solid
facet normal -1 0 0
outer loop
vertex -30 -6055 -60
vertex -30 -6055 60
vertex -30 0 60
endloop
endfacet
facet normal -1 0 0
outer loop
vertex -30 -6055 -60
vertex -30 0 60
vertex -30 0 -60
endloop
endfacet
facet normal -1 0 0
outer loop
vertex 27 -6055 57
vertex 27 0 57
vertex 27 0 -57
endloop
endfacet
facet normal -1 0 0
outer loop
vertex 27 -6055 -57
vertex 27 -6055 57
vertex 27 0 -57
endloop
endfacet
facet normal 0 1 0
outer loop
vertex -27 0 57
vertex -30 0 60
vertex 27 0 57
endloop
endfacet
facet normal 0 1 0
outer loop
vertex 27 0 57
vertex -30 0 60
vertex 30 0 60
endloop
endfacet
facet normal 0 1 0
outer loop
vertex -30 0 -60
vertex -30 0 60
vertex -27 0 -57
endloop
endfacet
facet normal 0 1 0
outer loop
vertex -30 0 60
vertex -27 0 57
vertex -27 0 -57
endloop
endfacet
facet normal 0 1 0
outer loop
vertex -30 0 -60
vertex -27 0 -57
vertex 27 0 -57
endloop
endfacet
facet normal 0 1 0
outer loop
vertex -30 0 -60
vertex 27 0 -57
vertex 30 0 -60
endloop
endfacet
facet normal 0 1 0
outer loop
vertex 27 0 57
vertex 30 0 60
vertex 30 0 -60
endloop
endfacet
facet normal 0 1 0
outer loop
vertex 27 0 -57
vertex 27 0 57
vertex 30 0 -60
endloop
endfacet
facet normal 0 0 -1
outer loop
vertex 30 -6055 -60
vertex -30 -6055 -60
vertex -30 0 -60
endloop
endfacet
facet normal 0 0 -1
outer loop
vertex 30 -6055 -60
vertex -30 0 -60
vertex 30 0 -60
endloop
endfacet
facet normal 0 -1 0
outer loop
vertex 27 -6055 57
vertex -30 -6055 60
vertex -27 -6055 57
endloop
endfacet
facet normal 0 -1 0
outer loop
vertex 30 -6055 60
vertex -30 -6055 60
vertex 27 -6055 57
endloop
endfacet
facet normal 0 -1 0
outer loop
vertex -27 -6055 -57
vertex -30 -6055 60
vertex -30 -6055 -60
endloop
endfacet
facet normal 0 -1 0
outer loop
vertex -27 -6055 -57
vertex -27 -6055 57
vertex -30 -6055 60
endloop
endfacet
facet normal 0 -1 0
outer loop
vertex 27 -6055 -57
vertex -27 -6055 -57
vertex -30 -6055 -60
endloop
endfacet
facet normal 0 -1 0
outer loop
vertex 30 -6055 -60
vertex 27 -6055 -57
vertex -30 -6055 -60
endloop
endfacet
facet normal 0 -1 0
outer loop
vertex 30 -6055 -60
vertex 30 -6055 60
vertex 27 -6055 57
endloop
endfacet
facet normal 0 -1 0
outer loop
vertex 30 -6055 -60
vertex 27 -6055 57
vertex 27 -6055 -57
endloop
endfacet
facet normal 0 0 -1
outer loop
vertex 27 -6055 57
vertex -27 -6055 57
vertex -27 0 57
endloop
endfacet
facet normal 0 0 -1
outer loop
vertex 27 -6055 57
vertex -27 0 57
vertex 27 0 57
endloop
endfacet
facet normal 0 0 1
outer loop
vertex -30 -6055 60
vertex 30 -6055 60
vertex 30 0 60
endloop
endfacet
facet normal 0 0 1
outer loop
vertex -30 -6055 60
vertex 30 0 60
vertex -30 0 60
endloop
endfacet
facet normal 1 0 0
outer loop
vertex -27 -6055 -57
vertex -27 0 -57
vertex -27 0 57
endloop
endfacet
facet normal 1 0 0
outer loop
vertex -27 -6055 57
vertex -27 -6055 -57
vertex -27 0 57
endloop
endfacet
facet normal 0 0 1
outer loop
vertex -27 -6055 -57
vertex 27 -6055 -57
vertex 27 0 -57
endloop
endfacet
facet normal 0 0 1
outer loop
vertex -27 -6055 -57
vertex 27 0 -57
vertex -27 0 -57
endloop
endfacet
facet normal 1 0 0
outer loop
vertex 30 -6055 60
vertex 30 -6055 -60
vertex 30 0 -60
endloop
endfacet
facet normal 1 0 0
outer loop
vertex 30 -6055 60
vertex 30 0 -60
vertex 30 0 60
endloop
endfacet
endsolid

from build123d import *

# Parameters (mm, degrees)
F0_W   = 60
F0_H   = 120
F0_W_2 = 54
F0_H_2 = 114


with BuildPart() as f2:
    # F2: sweep along a path in F1
    with BuildLine(Plane.YZ) as f2_path:
        Line((0, 0), (-6055, 0))
    # F0 (on Front) → F2 (sweep)
    with BuildSketch(Plane.XZ):
        Rectangle(F0_W, F0_H)
        Rectangle(F0_W_2, F0_H_2, mode=Mode.SUBTRACT)
    sweep(path=f2_path.line)


solid = f2.part
